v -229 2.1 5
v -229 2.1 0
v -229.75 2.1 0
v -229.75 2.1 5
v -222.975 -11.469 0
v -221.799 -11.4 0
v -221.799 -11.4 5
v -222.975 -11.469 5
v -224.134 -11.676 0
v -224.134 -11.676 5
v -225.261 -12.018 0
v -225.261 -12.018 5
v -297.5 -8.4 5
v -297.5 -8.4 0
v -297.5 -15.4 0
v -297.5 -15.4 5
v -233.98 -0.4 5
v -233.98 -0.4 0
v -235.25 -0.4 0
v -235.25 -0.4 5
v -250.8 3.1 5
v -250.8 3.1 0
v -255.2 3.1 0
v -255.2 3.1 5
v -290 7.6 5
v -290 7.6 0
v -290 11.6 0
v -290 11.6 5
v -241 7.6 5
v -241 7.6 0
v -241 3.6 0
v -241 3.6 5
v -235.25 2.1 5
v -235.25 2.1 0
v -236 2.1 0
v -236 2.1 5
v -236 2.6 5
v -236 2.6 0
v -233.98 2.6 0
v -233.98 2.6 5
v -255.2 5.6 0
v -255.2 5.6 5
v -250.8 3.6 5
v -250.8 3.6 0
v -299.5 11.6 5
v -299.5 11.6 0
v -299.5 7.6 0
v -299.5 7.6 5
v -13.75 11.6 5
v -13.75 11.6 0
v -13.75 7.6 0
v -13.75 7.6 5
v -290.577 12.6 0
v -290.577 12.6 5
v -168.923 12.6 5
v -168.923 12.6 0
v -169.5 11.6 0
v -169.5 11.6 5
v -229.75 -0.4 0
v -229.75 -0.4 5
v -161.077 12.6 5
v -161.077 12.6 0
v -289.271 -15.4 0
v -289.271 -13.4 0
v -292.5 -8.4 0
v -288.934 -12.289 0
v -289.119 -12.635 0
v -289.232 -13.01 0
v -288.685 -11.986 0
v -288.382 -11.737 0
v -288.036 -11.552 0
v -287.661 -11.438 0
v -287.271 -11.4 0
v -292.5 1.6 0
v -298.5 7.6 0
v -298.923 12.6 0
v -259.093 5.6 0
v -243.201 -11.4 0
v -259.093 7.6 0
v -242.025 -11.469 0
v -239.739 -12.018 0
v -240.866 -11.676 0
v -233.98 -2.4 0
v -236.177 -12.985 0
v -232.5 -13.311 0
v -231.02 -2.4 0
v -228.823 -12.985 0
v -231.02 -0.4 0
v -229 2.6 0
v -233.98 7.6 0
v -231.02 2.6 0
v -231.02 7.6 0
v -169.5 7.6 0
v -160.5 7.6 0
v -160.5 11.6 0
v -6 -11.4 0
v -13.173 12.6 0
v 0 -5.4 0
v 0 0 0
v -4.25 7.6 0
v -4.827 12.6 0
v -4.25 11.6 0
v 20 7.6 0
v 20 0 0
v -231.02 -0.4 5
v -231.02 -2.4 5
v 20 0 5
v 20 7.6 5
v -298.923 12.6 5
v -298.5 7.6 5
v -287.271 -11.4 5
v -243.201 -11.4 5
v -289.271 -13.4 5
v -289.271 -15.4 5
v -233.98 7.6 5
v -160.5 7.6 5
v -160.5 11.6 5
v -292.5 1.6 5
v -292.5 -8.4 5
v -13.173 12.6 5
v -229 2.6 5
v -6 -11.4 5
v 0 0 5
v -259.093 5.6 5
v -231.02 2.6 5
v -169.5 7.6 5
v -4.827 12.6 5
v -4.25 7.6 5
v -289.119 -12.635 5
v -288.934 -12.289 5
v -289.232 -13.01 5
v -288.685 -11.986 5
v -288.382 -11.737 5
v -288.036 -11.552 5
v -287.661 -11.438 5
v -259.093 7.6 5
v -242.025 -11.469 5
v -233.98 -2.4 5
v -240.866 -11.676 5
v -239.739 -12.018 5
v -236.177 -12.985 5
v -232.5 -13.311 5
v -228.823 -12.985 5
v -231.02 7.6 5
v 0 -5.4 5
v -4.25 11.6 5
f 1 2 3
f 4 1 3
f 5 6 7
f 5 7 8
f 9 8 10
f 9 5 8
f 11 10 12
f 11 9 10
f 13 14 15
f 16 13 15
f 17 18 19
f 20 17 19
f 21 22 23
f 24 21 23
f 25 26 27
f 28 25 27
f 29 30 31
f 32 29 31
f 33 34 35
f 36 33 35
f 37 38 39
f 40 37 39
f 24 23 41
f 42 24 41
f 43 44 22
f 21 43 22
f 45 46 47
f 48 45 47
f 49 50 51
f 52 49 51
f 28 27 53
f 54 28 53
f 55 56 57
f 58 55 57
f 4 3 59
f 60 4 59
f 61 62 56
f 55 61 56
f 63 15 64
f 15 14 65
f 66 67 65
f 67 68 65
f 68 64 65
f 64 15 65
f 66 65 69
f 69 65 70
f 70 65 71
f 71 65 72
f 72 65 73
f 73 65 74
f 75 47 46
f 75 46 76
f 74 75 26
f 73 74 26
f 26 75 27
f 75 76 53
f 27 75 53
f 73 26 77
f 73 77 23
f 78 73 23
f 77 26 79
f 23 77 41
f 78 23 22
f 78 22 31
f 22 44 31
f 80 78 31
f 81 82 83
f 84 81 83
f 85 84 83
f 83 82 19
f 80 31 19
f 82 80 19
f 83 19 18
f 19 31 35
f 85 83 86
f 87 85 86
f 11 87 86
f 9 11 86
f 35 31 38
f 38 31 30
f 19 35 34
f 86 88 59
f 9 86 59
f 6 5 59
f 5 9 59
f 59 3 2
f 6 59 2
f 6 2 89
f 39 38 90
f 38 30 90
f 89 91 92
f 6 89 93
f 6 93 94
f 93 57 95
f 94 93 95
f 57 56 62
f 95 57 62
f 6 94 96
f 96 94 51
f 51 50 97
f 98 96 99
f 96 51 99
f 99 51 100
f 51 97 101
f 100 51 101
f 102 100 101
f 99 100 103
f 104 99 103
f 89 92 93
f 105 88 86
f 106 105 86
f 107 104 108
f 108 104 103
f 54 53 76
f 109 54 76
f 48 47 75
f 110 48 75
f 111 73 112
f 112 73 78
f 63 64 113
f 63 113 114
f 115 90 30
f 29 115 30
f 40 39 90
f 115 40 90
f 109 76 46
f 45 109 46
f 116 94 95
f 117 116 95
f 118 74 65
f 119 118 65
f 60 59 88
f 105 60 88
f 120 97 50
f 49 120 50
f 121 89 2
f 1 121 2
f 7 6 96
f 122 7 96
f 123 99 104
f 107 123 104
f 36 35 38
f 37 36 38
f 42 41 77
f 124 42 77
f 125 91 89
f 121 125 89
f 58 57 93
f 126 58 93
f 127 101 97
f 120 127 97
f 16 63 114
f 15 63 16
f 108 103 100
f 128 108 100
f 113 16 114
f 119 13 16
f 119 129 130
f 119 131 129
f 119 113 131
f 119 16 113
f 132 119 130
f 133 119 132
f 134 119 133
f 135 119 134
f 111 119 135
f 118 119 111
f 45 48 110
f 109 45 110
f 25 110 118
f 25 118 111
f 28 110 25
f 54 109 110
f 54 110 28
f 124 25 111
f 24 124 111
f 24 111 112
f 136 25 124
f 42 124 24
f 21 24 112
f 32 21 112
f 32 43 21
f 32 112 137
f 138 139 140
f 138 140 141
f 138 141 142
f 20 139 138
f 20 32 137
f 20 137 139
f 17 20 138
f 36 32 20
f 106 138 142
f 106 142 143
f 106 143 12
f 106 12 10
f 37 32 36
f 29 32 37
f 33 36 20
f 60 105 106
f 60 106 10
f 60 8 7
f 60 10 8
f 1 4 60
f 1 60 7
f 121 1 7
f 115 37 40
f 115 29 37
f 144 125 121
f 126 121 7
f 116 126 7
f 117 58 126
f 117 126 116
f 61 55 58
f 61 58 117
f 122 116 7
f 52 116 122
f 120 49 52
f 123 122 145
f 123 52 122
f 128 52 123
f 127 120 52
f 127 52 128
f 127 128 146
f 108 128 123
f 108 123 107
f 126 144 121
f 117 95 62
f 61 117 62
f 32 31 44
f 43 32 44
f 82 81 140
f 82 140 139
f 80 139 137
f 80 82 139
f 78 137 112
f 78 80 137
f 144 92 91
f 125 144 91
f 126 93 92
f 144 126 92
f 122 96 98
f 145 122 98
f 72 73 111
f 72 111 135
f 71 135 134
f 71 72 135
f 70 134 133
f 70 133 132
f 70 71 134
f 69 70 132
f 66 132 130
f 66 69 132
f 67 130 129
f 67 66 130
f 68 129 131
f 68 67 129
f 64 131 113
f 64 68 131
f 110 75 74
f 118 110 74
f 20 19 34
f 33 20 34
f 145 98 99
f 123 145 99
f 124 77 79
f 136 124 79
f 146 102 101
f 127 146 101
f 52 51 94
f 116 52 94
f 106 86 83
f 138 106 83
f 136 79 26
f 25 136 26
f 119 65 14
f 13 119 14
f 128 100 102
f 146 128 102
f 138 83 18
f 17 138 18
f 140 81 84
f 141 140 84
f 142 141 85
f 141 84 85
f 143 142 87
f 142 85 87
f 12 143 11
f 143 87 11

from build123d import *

# Parameters (mm, degrees)
PAD_DEPTH = 5


with BuildPart() as part:
    # Sketch059 → Pad (new body)
    with BuildSketch(Plane.XY):
        with BuildLine():
            Line((-4.25, 11.6), (-4.82735, 12.6))
            Line((-4.82735, 12.6), (-13.17265, 12.6))
            Line((-13.17265, 12.6), (-13.75, 11.6))
            Line((-13.75, 11.6), (-13.75, 7.6))
            Line((-13.75, 7.6), (-160.5, 7.6))
            Line((-160.5, 7.6), (-160.5, 11.6))
            Line((-160.5, 11.6), (-161.07735, 12.6))
            Line((-161.07735, 12.6), (-168.92265, 12.6))
            Line((-168.92265, 12.6), (-169.5, 11.6))
            Line((-169.5, 11.6), (-169.5, 7.6))
            Line((-169.5, 7.6), (-231.02, 7.6))
            Line((-231.02, 7.6), (-231.02, 2.6))
            Line((-231.02, 2.6), (-229, 2.6))
            Line((-229, 2.6), (-229, 2.1))
            Line((-229, 2.1), (-229.75, 2.1))
            Line((-229.75, 2.1), (-229.75, -0.4))
            Line((-229.75, -0.4), (-231.02, -0.4))
            Line((-231.02, -0.4), (-231.02, -2.4))
            Line((-231.02, -2.4), (-233.98, -2.4))
            Line((-233.98, -2.4), (-233.98, -0.4))
            Line((-233.98, -0.4), (-235.25, -0.4))
            Line((-235.25, -0.4), (-235.25, 2.1))
            Line((-235.25, 2.1), (-236, 2.1))
            Line((-236, 2.1), (-236, 2.6))
            Line((-236, 2.6), (-233.98, 2.6))
            Line((-233.98, 2.6), (-233.98, 7.6))
            Line((-233.98, 7.6), (-241, 7.6))
            Line((-241, 7.6), (-241, 3.6))
            Line((-241, 3.6), (-250.8, 3.6))
            Line((-250.8, 3.6), (-250.8, 3.1))
            Line((-250.8, 3.1), (-255.2, 3.1))
            Line((-255.2, 3.1), (-255.2, 5.6))
            Line((-255.2, 5.6), (-259.093151, 5.6))
            Line((-259.093151, 5.6), (-259.093151, 7.6))
            Line((-259.093151, 7.6), (-290, 7.6))
            Line((-290, 7.6), (-290, 11.6))
            Line((-290, 11.6), (-290.57735, 12.6))
            Line((-290.57735, 12.6), (-298.92265, 12.6))
            Line((-298.92265, 12.6), (-299.5, 11.6))
            Line((-299.5, 11.6), (-299.5, 7.6))
            Line((-299.5, 7.6), (-298.5, 7.6))
            Line((-298.5, 7.6), (-292.5, 1.6))
            Line((-292.5, 1.6), (-292.5, -8.4))
            Line((-292.5, -8.4), (-297.5, -8.4))
            Line((-297.5, -8.4), (-297.5, -15.4))
            Line((-289.270832, -15.4), (-297.5, -15.4))
            Line((-289.270832, -13.4), (-289.270832, -15.4))
            ThreePointArc((-287.270832, -11.4), (-288.685046, -11.985786), (-289.270832, -13.4))
            Line((-287.270832, -11.4), (-243.200536, -11.4))
            ThreePointArc((-239.738833, -12.018283), (-241.442294, -11.555784), (-243.200536, -11.4))
            ThreePointArc((-239.738833, -12.018283), (-232.5, -13.311187), (-225.261167, -12.018283))
            ThreePointArc((-221.799464, -11.4), (-223.557706, -11.555784), (-225.261167, -12.018283))
            Line((-221.799464, -11.4), (-6, -11.4))
            Line((-6, -11.4), (0, -5.4))
            Line((0, -5.4), (0, 0))
            Line((0, 0), (20, 0))
            Line((20, 0), (20, 7.6))
            Line((20, 7.6), (-4.25, 7.6))
            Line((-4.25, 7.6), (-4.25, 11.6))
        make_face()
    extrude(amount=PAD_DEPTH)


solid = part.part
